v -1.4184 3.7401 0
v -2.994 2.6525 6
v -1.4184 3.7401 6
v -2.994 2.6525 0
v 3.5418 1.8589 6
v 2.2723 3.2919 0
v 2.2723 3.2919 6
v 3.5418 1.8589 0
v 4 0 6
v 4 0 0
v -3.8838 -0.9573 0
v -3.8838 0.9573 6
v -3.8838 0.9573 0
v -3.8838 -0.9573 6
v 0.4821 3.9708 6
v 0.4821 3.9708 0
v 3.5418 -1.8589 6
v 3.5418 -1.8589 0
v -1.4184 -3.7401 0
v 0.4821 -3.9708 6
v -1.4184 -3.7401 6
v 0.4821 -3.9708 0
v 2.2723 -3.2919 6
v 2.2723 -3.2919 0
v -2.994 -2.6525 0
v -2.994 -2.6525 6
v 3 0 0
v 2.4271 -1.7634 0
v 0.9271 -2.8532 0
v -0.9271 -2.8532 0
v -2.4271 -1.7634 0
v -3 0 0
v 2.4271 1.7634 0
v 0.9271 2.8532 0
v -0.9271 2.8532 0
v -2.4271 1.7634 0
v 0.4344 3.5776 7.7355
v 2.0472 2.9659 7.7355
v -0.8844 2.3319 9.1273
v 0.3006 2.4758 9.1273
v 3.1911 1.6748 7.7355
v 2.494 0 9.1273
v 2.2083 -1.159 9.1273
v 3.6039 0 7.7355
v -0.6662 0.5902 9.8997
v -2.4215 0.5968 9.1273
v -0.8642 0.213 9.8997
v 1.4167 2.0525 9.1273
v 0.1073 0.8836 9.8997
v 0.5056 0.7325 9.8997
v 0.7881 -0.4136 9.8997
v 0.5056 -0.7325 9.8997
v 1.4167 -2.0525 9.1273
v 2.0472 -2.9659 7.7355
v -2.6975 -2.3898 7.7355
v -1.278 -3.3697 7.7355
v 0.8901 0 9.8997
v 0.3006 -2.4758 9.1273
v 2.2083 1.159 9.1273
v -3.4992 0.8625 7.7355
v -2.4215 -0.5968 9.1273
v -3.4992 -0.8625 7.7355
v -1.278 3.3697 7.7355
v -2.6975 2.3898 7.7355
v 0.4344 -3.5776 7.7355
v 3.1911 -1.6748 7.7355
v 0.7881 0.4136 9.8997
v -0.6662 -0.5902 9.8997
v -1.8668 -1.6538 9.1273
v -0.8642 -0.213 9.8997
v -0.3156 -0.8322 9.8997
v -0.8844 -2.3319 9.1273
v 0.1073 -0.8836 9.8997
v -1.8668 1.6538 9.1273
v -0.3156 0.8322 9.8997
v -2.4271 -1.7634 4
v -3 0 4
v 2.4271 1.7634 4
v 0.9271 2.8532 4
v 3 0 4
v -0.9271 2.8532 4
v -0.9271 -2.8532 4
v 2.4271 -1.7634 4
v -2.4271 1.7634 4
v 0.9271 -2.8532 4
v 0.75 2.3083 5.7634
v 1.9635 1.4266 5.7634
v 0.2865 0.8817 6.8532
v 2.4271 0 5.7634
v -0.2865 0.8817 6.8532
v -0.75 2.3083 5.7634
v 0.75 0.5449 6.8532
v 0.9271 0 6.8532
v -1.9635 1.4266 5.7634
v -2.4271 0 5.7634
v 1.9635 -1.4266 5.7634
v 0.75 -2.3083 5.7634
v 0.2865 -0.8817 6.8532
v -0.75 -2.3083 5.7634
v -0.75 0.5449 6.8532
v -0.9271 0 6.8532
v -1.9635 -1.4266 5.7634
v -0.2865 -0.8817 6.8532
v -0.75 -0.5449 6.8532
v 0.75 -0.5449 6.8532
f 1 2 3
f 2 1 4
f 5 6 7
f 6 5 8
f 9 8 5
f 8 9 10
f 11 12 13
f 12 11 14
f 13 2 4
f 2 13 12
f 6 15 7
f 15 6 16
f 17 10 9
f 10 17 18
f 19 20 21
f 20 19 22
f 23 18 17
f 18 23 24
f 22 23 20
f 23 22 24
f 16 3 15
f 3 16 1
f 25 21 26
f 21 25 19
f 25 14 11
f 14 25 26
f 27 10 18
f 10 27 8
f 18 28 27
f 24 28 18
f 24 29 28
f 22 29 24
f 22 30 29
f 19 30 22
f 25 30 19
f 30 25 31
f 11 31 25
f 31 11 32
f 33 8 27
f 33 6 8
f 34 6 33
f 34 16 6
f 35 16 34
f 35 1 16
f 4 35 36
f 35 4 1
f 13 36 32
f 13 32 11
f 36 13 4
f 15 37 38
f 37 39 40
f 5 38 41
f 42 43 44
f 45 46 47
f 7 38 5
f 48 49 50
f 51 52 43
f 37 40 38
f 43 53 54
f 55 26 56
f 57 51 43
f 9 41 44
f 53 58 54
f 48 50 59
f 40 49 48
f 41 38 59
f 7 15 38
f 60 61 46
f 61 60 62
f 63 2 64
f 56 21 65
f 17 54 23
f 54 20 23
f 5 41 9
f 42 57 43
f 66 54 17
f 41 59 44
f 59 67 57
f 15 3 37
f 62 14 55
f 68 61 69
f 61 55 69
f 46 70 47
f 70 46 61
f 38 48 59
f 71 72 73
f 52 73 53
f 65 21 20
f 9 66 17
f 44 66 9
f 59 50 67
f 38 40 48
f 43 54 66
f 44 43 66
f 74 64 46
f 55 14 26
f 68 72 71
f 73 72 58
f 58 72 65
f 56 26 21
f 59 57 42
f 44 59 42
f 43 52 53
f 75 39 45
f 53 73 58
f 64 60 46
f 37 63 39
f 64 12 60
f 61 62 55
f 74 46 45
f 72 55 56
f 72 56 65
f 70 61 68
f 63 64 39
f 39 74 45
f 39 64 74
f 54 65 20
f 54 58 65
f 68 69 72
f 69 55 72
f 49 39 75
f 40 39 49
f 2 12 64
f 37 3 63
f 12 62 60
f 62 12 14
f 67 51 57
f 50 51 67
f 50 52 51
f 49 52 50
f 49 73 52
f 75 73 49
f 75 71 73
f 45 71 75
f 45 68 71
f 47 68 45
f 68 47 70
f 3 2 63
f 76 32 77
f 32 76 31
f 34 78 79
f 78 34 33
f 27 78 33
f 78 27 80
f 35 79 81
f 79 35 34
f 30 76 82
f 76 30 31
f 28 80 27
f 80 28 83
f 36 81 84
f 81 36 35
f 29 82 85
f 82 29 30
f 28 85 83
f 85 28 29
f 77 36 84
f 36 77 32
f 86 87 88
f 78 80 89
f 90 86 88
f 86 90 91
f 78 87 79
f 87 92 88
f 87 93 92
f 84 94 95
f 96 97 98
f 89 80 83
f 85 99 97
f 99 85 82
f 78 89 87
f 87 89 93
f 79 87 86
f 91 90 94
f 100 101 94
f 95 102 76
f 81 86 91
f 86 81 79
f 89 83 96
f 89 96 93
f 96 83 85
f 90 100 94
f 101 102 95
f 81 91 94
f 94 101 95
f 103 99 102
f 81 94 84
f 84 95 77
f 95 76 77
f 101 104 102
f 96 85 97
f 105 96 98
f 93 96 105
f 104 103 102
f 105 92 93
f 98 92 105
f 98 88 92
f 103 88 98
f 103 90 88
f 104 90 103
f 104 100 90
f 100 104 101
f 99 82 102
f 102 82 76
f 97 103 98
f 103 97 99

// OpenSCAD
width=6;
thickness=2;
length=6;

module cap()
{
	difference() {
		union() {
			cylinder( d=width+thickness, h=length );
			translate( [0,0,length] ) sphere( d=width + thickness );
		}
		translate( [0,0,-1] ) cylinder( d=width, h= 1 + length-thickness );
		translate( [0,0,length-thickness] ) sphere( d=width );

	}
}

cap();
